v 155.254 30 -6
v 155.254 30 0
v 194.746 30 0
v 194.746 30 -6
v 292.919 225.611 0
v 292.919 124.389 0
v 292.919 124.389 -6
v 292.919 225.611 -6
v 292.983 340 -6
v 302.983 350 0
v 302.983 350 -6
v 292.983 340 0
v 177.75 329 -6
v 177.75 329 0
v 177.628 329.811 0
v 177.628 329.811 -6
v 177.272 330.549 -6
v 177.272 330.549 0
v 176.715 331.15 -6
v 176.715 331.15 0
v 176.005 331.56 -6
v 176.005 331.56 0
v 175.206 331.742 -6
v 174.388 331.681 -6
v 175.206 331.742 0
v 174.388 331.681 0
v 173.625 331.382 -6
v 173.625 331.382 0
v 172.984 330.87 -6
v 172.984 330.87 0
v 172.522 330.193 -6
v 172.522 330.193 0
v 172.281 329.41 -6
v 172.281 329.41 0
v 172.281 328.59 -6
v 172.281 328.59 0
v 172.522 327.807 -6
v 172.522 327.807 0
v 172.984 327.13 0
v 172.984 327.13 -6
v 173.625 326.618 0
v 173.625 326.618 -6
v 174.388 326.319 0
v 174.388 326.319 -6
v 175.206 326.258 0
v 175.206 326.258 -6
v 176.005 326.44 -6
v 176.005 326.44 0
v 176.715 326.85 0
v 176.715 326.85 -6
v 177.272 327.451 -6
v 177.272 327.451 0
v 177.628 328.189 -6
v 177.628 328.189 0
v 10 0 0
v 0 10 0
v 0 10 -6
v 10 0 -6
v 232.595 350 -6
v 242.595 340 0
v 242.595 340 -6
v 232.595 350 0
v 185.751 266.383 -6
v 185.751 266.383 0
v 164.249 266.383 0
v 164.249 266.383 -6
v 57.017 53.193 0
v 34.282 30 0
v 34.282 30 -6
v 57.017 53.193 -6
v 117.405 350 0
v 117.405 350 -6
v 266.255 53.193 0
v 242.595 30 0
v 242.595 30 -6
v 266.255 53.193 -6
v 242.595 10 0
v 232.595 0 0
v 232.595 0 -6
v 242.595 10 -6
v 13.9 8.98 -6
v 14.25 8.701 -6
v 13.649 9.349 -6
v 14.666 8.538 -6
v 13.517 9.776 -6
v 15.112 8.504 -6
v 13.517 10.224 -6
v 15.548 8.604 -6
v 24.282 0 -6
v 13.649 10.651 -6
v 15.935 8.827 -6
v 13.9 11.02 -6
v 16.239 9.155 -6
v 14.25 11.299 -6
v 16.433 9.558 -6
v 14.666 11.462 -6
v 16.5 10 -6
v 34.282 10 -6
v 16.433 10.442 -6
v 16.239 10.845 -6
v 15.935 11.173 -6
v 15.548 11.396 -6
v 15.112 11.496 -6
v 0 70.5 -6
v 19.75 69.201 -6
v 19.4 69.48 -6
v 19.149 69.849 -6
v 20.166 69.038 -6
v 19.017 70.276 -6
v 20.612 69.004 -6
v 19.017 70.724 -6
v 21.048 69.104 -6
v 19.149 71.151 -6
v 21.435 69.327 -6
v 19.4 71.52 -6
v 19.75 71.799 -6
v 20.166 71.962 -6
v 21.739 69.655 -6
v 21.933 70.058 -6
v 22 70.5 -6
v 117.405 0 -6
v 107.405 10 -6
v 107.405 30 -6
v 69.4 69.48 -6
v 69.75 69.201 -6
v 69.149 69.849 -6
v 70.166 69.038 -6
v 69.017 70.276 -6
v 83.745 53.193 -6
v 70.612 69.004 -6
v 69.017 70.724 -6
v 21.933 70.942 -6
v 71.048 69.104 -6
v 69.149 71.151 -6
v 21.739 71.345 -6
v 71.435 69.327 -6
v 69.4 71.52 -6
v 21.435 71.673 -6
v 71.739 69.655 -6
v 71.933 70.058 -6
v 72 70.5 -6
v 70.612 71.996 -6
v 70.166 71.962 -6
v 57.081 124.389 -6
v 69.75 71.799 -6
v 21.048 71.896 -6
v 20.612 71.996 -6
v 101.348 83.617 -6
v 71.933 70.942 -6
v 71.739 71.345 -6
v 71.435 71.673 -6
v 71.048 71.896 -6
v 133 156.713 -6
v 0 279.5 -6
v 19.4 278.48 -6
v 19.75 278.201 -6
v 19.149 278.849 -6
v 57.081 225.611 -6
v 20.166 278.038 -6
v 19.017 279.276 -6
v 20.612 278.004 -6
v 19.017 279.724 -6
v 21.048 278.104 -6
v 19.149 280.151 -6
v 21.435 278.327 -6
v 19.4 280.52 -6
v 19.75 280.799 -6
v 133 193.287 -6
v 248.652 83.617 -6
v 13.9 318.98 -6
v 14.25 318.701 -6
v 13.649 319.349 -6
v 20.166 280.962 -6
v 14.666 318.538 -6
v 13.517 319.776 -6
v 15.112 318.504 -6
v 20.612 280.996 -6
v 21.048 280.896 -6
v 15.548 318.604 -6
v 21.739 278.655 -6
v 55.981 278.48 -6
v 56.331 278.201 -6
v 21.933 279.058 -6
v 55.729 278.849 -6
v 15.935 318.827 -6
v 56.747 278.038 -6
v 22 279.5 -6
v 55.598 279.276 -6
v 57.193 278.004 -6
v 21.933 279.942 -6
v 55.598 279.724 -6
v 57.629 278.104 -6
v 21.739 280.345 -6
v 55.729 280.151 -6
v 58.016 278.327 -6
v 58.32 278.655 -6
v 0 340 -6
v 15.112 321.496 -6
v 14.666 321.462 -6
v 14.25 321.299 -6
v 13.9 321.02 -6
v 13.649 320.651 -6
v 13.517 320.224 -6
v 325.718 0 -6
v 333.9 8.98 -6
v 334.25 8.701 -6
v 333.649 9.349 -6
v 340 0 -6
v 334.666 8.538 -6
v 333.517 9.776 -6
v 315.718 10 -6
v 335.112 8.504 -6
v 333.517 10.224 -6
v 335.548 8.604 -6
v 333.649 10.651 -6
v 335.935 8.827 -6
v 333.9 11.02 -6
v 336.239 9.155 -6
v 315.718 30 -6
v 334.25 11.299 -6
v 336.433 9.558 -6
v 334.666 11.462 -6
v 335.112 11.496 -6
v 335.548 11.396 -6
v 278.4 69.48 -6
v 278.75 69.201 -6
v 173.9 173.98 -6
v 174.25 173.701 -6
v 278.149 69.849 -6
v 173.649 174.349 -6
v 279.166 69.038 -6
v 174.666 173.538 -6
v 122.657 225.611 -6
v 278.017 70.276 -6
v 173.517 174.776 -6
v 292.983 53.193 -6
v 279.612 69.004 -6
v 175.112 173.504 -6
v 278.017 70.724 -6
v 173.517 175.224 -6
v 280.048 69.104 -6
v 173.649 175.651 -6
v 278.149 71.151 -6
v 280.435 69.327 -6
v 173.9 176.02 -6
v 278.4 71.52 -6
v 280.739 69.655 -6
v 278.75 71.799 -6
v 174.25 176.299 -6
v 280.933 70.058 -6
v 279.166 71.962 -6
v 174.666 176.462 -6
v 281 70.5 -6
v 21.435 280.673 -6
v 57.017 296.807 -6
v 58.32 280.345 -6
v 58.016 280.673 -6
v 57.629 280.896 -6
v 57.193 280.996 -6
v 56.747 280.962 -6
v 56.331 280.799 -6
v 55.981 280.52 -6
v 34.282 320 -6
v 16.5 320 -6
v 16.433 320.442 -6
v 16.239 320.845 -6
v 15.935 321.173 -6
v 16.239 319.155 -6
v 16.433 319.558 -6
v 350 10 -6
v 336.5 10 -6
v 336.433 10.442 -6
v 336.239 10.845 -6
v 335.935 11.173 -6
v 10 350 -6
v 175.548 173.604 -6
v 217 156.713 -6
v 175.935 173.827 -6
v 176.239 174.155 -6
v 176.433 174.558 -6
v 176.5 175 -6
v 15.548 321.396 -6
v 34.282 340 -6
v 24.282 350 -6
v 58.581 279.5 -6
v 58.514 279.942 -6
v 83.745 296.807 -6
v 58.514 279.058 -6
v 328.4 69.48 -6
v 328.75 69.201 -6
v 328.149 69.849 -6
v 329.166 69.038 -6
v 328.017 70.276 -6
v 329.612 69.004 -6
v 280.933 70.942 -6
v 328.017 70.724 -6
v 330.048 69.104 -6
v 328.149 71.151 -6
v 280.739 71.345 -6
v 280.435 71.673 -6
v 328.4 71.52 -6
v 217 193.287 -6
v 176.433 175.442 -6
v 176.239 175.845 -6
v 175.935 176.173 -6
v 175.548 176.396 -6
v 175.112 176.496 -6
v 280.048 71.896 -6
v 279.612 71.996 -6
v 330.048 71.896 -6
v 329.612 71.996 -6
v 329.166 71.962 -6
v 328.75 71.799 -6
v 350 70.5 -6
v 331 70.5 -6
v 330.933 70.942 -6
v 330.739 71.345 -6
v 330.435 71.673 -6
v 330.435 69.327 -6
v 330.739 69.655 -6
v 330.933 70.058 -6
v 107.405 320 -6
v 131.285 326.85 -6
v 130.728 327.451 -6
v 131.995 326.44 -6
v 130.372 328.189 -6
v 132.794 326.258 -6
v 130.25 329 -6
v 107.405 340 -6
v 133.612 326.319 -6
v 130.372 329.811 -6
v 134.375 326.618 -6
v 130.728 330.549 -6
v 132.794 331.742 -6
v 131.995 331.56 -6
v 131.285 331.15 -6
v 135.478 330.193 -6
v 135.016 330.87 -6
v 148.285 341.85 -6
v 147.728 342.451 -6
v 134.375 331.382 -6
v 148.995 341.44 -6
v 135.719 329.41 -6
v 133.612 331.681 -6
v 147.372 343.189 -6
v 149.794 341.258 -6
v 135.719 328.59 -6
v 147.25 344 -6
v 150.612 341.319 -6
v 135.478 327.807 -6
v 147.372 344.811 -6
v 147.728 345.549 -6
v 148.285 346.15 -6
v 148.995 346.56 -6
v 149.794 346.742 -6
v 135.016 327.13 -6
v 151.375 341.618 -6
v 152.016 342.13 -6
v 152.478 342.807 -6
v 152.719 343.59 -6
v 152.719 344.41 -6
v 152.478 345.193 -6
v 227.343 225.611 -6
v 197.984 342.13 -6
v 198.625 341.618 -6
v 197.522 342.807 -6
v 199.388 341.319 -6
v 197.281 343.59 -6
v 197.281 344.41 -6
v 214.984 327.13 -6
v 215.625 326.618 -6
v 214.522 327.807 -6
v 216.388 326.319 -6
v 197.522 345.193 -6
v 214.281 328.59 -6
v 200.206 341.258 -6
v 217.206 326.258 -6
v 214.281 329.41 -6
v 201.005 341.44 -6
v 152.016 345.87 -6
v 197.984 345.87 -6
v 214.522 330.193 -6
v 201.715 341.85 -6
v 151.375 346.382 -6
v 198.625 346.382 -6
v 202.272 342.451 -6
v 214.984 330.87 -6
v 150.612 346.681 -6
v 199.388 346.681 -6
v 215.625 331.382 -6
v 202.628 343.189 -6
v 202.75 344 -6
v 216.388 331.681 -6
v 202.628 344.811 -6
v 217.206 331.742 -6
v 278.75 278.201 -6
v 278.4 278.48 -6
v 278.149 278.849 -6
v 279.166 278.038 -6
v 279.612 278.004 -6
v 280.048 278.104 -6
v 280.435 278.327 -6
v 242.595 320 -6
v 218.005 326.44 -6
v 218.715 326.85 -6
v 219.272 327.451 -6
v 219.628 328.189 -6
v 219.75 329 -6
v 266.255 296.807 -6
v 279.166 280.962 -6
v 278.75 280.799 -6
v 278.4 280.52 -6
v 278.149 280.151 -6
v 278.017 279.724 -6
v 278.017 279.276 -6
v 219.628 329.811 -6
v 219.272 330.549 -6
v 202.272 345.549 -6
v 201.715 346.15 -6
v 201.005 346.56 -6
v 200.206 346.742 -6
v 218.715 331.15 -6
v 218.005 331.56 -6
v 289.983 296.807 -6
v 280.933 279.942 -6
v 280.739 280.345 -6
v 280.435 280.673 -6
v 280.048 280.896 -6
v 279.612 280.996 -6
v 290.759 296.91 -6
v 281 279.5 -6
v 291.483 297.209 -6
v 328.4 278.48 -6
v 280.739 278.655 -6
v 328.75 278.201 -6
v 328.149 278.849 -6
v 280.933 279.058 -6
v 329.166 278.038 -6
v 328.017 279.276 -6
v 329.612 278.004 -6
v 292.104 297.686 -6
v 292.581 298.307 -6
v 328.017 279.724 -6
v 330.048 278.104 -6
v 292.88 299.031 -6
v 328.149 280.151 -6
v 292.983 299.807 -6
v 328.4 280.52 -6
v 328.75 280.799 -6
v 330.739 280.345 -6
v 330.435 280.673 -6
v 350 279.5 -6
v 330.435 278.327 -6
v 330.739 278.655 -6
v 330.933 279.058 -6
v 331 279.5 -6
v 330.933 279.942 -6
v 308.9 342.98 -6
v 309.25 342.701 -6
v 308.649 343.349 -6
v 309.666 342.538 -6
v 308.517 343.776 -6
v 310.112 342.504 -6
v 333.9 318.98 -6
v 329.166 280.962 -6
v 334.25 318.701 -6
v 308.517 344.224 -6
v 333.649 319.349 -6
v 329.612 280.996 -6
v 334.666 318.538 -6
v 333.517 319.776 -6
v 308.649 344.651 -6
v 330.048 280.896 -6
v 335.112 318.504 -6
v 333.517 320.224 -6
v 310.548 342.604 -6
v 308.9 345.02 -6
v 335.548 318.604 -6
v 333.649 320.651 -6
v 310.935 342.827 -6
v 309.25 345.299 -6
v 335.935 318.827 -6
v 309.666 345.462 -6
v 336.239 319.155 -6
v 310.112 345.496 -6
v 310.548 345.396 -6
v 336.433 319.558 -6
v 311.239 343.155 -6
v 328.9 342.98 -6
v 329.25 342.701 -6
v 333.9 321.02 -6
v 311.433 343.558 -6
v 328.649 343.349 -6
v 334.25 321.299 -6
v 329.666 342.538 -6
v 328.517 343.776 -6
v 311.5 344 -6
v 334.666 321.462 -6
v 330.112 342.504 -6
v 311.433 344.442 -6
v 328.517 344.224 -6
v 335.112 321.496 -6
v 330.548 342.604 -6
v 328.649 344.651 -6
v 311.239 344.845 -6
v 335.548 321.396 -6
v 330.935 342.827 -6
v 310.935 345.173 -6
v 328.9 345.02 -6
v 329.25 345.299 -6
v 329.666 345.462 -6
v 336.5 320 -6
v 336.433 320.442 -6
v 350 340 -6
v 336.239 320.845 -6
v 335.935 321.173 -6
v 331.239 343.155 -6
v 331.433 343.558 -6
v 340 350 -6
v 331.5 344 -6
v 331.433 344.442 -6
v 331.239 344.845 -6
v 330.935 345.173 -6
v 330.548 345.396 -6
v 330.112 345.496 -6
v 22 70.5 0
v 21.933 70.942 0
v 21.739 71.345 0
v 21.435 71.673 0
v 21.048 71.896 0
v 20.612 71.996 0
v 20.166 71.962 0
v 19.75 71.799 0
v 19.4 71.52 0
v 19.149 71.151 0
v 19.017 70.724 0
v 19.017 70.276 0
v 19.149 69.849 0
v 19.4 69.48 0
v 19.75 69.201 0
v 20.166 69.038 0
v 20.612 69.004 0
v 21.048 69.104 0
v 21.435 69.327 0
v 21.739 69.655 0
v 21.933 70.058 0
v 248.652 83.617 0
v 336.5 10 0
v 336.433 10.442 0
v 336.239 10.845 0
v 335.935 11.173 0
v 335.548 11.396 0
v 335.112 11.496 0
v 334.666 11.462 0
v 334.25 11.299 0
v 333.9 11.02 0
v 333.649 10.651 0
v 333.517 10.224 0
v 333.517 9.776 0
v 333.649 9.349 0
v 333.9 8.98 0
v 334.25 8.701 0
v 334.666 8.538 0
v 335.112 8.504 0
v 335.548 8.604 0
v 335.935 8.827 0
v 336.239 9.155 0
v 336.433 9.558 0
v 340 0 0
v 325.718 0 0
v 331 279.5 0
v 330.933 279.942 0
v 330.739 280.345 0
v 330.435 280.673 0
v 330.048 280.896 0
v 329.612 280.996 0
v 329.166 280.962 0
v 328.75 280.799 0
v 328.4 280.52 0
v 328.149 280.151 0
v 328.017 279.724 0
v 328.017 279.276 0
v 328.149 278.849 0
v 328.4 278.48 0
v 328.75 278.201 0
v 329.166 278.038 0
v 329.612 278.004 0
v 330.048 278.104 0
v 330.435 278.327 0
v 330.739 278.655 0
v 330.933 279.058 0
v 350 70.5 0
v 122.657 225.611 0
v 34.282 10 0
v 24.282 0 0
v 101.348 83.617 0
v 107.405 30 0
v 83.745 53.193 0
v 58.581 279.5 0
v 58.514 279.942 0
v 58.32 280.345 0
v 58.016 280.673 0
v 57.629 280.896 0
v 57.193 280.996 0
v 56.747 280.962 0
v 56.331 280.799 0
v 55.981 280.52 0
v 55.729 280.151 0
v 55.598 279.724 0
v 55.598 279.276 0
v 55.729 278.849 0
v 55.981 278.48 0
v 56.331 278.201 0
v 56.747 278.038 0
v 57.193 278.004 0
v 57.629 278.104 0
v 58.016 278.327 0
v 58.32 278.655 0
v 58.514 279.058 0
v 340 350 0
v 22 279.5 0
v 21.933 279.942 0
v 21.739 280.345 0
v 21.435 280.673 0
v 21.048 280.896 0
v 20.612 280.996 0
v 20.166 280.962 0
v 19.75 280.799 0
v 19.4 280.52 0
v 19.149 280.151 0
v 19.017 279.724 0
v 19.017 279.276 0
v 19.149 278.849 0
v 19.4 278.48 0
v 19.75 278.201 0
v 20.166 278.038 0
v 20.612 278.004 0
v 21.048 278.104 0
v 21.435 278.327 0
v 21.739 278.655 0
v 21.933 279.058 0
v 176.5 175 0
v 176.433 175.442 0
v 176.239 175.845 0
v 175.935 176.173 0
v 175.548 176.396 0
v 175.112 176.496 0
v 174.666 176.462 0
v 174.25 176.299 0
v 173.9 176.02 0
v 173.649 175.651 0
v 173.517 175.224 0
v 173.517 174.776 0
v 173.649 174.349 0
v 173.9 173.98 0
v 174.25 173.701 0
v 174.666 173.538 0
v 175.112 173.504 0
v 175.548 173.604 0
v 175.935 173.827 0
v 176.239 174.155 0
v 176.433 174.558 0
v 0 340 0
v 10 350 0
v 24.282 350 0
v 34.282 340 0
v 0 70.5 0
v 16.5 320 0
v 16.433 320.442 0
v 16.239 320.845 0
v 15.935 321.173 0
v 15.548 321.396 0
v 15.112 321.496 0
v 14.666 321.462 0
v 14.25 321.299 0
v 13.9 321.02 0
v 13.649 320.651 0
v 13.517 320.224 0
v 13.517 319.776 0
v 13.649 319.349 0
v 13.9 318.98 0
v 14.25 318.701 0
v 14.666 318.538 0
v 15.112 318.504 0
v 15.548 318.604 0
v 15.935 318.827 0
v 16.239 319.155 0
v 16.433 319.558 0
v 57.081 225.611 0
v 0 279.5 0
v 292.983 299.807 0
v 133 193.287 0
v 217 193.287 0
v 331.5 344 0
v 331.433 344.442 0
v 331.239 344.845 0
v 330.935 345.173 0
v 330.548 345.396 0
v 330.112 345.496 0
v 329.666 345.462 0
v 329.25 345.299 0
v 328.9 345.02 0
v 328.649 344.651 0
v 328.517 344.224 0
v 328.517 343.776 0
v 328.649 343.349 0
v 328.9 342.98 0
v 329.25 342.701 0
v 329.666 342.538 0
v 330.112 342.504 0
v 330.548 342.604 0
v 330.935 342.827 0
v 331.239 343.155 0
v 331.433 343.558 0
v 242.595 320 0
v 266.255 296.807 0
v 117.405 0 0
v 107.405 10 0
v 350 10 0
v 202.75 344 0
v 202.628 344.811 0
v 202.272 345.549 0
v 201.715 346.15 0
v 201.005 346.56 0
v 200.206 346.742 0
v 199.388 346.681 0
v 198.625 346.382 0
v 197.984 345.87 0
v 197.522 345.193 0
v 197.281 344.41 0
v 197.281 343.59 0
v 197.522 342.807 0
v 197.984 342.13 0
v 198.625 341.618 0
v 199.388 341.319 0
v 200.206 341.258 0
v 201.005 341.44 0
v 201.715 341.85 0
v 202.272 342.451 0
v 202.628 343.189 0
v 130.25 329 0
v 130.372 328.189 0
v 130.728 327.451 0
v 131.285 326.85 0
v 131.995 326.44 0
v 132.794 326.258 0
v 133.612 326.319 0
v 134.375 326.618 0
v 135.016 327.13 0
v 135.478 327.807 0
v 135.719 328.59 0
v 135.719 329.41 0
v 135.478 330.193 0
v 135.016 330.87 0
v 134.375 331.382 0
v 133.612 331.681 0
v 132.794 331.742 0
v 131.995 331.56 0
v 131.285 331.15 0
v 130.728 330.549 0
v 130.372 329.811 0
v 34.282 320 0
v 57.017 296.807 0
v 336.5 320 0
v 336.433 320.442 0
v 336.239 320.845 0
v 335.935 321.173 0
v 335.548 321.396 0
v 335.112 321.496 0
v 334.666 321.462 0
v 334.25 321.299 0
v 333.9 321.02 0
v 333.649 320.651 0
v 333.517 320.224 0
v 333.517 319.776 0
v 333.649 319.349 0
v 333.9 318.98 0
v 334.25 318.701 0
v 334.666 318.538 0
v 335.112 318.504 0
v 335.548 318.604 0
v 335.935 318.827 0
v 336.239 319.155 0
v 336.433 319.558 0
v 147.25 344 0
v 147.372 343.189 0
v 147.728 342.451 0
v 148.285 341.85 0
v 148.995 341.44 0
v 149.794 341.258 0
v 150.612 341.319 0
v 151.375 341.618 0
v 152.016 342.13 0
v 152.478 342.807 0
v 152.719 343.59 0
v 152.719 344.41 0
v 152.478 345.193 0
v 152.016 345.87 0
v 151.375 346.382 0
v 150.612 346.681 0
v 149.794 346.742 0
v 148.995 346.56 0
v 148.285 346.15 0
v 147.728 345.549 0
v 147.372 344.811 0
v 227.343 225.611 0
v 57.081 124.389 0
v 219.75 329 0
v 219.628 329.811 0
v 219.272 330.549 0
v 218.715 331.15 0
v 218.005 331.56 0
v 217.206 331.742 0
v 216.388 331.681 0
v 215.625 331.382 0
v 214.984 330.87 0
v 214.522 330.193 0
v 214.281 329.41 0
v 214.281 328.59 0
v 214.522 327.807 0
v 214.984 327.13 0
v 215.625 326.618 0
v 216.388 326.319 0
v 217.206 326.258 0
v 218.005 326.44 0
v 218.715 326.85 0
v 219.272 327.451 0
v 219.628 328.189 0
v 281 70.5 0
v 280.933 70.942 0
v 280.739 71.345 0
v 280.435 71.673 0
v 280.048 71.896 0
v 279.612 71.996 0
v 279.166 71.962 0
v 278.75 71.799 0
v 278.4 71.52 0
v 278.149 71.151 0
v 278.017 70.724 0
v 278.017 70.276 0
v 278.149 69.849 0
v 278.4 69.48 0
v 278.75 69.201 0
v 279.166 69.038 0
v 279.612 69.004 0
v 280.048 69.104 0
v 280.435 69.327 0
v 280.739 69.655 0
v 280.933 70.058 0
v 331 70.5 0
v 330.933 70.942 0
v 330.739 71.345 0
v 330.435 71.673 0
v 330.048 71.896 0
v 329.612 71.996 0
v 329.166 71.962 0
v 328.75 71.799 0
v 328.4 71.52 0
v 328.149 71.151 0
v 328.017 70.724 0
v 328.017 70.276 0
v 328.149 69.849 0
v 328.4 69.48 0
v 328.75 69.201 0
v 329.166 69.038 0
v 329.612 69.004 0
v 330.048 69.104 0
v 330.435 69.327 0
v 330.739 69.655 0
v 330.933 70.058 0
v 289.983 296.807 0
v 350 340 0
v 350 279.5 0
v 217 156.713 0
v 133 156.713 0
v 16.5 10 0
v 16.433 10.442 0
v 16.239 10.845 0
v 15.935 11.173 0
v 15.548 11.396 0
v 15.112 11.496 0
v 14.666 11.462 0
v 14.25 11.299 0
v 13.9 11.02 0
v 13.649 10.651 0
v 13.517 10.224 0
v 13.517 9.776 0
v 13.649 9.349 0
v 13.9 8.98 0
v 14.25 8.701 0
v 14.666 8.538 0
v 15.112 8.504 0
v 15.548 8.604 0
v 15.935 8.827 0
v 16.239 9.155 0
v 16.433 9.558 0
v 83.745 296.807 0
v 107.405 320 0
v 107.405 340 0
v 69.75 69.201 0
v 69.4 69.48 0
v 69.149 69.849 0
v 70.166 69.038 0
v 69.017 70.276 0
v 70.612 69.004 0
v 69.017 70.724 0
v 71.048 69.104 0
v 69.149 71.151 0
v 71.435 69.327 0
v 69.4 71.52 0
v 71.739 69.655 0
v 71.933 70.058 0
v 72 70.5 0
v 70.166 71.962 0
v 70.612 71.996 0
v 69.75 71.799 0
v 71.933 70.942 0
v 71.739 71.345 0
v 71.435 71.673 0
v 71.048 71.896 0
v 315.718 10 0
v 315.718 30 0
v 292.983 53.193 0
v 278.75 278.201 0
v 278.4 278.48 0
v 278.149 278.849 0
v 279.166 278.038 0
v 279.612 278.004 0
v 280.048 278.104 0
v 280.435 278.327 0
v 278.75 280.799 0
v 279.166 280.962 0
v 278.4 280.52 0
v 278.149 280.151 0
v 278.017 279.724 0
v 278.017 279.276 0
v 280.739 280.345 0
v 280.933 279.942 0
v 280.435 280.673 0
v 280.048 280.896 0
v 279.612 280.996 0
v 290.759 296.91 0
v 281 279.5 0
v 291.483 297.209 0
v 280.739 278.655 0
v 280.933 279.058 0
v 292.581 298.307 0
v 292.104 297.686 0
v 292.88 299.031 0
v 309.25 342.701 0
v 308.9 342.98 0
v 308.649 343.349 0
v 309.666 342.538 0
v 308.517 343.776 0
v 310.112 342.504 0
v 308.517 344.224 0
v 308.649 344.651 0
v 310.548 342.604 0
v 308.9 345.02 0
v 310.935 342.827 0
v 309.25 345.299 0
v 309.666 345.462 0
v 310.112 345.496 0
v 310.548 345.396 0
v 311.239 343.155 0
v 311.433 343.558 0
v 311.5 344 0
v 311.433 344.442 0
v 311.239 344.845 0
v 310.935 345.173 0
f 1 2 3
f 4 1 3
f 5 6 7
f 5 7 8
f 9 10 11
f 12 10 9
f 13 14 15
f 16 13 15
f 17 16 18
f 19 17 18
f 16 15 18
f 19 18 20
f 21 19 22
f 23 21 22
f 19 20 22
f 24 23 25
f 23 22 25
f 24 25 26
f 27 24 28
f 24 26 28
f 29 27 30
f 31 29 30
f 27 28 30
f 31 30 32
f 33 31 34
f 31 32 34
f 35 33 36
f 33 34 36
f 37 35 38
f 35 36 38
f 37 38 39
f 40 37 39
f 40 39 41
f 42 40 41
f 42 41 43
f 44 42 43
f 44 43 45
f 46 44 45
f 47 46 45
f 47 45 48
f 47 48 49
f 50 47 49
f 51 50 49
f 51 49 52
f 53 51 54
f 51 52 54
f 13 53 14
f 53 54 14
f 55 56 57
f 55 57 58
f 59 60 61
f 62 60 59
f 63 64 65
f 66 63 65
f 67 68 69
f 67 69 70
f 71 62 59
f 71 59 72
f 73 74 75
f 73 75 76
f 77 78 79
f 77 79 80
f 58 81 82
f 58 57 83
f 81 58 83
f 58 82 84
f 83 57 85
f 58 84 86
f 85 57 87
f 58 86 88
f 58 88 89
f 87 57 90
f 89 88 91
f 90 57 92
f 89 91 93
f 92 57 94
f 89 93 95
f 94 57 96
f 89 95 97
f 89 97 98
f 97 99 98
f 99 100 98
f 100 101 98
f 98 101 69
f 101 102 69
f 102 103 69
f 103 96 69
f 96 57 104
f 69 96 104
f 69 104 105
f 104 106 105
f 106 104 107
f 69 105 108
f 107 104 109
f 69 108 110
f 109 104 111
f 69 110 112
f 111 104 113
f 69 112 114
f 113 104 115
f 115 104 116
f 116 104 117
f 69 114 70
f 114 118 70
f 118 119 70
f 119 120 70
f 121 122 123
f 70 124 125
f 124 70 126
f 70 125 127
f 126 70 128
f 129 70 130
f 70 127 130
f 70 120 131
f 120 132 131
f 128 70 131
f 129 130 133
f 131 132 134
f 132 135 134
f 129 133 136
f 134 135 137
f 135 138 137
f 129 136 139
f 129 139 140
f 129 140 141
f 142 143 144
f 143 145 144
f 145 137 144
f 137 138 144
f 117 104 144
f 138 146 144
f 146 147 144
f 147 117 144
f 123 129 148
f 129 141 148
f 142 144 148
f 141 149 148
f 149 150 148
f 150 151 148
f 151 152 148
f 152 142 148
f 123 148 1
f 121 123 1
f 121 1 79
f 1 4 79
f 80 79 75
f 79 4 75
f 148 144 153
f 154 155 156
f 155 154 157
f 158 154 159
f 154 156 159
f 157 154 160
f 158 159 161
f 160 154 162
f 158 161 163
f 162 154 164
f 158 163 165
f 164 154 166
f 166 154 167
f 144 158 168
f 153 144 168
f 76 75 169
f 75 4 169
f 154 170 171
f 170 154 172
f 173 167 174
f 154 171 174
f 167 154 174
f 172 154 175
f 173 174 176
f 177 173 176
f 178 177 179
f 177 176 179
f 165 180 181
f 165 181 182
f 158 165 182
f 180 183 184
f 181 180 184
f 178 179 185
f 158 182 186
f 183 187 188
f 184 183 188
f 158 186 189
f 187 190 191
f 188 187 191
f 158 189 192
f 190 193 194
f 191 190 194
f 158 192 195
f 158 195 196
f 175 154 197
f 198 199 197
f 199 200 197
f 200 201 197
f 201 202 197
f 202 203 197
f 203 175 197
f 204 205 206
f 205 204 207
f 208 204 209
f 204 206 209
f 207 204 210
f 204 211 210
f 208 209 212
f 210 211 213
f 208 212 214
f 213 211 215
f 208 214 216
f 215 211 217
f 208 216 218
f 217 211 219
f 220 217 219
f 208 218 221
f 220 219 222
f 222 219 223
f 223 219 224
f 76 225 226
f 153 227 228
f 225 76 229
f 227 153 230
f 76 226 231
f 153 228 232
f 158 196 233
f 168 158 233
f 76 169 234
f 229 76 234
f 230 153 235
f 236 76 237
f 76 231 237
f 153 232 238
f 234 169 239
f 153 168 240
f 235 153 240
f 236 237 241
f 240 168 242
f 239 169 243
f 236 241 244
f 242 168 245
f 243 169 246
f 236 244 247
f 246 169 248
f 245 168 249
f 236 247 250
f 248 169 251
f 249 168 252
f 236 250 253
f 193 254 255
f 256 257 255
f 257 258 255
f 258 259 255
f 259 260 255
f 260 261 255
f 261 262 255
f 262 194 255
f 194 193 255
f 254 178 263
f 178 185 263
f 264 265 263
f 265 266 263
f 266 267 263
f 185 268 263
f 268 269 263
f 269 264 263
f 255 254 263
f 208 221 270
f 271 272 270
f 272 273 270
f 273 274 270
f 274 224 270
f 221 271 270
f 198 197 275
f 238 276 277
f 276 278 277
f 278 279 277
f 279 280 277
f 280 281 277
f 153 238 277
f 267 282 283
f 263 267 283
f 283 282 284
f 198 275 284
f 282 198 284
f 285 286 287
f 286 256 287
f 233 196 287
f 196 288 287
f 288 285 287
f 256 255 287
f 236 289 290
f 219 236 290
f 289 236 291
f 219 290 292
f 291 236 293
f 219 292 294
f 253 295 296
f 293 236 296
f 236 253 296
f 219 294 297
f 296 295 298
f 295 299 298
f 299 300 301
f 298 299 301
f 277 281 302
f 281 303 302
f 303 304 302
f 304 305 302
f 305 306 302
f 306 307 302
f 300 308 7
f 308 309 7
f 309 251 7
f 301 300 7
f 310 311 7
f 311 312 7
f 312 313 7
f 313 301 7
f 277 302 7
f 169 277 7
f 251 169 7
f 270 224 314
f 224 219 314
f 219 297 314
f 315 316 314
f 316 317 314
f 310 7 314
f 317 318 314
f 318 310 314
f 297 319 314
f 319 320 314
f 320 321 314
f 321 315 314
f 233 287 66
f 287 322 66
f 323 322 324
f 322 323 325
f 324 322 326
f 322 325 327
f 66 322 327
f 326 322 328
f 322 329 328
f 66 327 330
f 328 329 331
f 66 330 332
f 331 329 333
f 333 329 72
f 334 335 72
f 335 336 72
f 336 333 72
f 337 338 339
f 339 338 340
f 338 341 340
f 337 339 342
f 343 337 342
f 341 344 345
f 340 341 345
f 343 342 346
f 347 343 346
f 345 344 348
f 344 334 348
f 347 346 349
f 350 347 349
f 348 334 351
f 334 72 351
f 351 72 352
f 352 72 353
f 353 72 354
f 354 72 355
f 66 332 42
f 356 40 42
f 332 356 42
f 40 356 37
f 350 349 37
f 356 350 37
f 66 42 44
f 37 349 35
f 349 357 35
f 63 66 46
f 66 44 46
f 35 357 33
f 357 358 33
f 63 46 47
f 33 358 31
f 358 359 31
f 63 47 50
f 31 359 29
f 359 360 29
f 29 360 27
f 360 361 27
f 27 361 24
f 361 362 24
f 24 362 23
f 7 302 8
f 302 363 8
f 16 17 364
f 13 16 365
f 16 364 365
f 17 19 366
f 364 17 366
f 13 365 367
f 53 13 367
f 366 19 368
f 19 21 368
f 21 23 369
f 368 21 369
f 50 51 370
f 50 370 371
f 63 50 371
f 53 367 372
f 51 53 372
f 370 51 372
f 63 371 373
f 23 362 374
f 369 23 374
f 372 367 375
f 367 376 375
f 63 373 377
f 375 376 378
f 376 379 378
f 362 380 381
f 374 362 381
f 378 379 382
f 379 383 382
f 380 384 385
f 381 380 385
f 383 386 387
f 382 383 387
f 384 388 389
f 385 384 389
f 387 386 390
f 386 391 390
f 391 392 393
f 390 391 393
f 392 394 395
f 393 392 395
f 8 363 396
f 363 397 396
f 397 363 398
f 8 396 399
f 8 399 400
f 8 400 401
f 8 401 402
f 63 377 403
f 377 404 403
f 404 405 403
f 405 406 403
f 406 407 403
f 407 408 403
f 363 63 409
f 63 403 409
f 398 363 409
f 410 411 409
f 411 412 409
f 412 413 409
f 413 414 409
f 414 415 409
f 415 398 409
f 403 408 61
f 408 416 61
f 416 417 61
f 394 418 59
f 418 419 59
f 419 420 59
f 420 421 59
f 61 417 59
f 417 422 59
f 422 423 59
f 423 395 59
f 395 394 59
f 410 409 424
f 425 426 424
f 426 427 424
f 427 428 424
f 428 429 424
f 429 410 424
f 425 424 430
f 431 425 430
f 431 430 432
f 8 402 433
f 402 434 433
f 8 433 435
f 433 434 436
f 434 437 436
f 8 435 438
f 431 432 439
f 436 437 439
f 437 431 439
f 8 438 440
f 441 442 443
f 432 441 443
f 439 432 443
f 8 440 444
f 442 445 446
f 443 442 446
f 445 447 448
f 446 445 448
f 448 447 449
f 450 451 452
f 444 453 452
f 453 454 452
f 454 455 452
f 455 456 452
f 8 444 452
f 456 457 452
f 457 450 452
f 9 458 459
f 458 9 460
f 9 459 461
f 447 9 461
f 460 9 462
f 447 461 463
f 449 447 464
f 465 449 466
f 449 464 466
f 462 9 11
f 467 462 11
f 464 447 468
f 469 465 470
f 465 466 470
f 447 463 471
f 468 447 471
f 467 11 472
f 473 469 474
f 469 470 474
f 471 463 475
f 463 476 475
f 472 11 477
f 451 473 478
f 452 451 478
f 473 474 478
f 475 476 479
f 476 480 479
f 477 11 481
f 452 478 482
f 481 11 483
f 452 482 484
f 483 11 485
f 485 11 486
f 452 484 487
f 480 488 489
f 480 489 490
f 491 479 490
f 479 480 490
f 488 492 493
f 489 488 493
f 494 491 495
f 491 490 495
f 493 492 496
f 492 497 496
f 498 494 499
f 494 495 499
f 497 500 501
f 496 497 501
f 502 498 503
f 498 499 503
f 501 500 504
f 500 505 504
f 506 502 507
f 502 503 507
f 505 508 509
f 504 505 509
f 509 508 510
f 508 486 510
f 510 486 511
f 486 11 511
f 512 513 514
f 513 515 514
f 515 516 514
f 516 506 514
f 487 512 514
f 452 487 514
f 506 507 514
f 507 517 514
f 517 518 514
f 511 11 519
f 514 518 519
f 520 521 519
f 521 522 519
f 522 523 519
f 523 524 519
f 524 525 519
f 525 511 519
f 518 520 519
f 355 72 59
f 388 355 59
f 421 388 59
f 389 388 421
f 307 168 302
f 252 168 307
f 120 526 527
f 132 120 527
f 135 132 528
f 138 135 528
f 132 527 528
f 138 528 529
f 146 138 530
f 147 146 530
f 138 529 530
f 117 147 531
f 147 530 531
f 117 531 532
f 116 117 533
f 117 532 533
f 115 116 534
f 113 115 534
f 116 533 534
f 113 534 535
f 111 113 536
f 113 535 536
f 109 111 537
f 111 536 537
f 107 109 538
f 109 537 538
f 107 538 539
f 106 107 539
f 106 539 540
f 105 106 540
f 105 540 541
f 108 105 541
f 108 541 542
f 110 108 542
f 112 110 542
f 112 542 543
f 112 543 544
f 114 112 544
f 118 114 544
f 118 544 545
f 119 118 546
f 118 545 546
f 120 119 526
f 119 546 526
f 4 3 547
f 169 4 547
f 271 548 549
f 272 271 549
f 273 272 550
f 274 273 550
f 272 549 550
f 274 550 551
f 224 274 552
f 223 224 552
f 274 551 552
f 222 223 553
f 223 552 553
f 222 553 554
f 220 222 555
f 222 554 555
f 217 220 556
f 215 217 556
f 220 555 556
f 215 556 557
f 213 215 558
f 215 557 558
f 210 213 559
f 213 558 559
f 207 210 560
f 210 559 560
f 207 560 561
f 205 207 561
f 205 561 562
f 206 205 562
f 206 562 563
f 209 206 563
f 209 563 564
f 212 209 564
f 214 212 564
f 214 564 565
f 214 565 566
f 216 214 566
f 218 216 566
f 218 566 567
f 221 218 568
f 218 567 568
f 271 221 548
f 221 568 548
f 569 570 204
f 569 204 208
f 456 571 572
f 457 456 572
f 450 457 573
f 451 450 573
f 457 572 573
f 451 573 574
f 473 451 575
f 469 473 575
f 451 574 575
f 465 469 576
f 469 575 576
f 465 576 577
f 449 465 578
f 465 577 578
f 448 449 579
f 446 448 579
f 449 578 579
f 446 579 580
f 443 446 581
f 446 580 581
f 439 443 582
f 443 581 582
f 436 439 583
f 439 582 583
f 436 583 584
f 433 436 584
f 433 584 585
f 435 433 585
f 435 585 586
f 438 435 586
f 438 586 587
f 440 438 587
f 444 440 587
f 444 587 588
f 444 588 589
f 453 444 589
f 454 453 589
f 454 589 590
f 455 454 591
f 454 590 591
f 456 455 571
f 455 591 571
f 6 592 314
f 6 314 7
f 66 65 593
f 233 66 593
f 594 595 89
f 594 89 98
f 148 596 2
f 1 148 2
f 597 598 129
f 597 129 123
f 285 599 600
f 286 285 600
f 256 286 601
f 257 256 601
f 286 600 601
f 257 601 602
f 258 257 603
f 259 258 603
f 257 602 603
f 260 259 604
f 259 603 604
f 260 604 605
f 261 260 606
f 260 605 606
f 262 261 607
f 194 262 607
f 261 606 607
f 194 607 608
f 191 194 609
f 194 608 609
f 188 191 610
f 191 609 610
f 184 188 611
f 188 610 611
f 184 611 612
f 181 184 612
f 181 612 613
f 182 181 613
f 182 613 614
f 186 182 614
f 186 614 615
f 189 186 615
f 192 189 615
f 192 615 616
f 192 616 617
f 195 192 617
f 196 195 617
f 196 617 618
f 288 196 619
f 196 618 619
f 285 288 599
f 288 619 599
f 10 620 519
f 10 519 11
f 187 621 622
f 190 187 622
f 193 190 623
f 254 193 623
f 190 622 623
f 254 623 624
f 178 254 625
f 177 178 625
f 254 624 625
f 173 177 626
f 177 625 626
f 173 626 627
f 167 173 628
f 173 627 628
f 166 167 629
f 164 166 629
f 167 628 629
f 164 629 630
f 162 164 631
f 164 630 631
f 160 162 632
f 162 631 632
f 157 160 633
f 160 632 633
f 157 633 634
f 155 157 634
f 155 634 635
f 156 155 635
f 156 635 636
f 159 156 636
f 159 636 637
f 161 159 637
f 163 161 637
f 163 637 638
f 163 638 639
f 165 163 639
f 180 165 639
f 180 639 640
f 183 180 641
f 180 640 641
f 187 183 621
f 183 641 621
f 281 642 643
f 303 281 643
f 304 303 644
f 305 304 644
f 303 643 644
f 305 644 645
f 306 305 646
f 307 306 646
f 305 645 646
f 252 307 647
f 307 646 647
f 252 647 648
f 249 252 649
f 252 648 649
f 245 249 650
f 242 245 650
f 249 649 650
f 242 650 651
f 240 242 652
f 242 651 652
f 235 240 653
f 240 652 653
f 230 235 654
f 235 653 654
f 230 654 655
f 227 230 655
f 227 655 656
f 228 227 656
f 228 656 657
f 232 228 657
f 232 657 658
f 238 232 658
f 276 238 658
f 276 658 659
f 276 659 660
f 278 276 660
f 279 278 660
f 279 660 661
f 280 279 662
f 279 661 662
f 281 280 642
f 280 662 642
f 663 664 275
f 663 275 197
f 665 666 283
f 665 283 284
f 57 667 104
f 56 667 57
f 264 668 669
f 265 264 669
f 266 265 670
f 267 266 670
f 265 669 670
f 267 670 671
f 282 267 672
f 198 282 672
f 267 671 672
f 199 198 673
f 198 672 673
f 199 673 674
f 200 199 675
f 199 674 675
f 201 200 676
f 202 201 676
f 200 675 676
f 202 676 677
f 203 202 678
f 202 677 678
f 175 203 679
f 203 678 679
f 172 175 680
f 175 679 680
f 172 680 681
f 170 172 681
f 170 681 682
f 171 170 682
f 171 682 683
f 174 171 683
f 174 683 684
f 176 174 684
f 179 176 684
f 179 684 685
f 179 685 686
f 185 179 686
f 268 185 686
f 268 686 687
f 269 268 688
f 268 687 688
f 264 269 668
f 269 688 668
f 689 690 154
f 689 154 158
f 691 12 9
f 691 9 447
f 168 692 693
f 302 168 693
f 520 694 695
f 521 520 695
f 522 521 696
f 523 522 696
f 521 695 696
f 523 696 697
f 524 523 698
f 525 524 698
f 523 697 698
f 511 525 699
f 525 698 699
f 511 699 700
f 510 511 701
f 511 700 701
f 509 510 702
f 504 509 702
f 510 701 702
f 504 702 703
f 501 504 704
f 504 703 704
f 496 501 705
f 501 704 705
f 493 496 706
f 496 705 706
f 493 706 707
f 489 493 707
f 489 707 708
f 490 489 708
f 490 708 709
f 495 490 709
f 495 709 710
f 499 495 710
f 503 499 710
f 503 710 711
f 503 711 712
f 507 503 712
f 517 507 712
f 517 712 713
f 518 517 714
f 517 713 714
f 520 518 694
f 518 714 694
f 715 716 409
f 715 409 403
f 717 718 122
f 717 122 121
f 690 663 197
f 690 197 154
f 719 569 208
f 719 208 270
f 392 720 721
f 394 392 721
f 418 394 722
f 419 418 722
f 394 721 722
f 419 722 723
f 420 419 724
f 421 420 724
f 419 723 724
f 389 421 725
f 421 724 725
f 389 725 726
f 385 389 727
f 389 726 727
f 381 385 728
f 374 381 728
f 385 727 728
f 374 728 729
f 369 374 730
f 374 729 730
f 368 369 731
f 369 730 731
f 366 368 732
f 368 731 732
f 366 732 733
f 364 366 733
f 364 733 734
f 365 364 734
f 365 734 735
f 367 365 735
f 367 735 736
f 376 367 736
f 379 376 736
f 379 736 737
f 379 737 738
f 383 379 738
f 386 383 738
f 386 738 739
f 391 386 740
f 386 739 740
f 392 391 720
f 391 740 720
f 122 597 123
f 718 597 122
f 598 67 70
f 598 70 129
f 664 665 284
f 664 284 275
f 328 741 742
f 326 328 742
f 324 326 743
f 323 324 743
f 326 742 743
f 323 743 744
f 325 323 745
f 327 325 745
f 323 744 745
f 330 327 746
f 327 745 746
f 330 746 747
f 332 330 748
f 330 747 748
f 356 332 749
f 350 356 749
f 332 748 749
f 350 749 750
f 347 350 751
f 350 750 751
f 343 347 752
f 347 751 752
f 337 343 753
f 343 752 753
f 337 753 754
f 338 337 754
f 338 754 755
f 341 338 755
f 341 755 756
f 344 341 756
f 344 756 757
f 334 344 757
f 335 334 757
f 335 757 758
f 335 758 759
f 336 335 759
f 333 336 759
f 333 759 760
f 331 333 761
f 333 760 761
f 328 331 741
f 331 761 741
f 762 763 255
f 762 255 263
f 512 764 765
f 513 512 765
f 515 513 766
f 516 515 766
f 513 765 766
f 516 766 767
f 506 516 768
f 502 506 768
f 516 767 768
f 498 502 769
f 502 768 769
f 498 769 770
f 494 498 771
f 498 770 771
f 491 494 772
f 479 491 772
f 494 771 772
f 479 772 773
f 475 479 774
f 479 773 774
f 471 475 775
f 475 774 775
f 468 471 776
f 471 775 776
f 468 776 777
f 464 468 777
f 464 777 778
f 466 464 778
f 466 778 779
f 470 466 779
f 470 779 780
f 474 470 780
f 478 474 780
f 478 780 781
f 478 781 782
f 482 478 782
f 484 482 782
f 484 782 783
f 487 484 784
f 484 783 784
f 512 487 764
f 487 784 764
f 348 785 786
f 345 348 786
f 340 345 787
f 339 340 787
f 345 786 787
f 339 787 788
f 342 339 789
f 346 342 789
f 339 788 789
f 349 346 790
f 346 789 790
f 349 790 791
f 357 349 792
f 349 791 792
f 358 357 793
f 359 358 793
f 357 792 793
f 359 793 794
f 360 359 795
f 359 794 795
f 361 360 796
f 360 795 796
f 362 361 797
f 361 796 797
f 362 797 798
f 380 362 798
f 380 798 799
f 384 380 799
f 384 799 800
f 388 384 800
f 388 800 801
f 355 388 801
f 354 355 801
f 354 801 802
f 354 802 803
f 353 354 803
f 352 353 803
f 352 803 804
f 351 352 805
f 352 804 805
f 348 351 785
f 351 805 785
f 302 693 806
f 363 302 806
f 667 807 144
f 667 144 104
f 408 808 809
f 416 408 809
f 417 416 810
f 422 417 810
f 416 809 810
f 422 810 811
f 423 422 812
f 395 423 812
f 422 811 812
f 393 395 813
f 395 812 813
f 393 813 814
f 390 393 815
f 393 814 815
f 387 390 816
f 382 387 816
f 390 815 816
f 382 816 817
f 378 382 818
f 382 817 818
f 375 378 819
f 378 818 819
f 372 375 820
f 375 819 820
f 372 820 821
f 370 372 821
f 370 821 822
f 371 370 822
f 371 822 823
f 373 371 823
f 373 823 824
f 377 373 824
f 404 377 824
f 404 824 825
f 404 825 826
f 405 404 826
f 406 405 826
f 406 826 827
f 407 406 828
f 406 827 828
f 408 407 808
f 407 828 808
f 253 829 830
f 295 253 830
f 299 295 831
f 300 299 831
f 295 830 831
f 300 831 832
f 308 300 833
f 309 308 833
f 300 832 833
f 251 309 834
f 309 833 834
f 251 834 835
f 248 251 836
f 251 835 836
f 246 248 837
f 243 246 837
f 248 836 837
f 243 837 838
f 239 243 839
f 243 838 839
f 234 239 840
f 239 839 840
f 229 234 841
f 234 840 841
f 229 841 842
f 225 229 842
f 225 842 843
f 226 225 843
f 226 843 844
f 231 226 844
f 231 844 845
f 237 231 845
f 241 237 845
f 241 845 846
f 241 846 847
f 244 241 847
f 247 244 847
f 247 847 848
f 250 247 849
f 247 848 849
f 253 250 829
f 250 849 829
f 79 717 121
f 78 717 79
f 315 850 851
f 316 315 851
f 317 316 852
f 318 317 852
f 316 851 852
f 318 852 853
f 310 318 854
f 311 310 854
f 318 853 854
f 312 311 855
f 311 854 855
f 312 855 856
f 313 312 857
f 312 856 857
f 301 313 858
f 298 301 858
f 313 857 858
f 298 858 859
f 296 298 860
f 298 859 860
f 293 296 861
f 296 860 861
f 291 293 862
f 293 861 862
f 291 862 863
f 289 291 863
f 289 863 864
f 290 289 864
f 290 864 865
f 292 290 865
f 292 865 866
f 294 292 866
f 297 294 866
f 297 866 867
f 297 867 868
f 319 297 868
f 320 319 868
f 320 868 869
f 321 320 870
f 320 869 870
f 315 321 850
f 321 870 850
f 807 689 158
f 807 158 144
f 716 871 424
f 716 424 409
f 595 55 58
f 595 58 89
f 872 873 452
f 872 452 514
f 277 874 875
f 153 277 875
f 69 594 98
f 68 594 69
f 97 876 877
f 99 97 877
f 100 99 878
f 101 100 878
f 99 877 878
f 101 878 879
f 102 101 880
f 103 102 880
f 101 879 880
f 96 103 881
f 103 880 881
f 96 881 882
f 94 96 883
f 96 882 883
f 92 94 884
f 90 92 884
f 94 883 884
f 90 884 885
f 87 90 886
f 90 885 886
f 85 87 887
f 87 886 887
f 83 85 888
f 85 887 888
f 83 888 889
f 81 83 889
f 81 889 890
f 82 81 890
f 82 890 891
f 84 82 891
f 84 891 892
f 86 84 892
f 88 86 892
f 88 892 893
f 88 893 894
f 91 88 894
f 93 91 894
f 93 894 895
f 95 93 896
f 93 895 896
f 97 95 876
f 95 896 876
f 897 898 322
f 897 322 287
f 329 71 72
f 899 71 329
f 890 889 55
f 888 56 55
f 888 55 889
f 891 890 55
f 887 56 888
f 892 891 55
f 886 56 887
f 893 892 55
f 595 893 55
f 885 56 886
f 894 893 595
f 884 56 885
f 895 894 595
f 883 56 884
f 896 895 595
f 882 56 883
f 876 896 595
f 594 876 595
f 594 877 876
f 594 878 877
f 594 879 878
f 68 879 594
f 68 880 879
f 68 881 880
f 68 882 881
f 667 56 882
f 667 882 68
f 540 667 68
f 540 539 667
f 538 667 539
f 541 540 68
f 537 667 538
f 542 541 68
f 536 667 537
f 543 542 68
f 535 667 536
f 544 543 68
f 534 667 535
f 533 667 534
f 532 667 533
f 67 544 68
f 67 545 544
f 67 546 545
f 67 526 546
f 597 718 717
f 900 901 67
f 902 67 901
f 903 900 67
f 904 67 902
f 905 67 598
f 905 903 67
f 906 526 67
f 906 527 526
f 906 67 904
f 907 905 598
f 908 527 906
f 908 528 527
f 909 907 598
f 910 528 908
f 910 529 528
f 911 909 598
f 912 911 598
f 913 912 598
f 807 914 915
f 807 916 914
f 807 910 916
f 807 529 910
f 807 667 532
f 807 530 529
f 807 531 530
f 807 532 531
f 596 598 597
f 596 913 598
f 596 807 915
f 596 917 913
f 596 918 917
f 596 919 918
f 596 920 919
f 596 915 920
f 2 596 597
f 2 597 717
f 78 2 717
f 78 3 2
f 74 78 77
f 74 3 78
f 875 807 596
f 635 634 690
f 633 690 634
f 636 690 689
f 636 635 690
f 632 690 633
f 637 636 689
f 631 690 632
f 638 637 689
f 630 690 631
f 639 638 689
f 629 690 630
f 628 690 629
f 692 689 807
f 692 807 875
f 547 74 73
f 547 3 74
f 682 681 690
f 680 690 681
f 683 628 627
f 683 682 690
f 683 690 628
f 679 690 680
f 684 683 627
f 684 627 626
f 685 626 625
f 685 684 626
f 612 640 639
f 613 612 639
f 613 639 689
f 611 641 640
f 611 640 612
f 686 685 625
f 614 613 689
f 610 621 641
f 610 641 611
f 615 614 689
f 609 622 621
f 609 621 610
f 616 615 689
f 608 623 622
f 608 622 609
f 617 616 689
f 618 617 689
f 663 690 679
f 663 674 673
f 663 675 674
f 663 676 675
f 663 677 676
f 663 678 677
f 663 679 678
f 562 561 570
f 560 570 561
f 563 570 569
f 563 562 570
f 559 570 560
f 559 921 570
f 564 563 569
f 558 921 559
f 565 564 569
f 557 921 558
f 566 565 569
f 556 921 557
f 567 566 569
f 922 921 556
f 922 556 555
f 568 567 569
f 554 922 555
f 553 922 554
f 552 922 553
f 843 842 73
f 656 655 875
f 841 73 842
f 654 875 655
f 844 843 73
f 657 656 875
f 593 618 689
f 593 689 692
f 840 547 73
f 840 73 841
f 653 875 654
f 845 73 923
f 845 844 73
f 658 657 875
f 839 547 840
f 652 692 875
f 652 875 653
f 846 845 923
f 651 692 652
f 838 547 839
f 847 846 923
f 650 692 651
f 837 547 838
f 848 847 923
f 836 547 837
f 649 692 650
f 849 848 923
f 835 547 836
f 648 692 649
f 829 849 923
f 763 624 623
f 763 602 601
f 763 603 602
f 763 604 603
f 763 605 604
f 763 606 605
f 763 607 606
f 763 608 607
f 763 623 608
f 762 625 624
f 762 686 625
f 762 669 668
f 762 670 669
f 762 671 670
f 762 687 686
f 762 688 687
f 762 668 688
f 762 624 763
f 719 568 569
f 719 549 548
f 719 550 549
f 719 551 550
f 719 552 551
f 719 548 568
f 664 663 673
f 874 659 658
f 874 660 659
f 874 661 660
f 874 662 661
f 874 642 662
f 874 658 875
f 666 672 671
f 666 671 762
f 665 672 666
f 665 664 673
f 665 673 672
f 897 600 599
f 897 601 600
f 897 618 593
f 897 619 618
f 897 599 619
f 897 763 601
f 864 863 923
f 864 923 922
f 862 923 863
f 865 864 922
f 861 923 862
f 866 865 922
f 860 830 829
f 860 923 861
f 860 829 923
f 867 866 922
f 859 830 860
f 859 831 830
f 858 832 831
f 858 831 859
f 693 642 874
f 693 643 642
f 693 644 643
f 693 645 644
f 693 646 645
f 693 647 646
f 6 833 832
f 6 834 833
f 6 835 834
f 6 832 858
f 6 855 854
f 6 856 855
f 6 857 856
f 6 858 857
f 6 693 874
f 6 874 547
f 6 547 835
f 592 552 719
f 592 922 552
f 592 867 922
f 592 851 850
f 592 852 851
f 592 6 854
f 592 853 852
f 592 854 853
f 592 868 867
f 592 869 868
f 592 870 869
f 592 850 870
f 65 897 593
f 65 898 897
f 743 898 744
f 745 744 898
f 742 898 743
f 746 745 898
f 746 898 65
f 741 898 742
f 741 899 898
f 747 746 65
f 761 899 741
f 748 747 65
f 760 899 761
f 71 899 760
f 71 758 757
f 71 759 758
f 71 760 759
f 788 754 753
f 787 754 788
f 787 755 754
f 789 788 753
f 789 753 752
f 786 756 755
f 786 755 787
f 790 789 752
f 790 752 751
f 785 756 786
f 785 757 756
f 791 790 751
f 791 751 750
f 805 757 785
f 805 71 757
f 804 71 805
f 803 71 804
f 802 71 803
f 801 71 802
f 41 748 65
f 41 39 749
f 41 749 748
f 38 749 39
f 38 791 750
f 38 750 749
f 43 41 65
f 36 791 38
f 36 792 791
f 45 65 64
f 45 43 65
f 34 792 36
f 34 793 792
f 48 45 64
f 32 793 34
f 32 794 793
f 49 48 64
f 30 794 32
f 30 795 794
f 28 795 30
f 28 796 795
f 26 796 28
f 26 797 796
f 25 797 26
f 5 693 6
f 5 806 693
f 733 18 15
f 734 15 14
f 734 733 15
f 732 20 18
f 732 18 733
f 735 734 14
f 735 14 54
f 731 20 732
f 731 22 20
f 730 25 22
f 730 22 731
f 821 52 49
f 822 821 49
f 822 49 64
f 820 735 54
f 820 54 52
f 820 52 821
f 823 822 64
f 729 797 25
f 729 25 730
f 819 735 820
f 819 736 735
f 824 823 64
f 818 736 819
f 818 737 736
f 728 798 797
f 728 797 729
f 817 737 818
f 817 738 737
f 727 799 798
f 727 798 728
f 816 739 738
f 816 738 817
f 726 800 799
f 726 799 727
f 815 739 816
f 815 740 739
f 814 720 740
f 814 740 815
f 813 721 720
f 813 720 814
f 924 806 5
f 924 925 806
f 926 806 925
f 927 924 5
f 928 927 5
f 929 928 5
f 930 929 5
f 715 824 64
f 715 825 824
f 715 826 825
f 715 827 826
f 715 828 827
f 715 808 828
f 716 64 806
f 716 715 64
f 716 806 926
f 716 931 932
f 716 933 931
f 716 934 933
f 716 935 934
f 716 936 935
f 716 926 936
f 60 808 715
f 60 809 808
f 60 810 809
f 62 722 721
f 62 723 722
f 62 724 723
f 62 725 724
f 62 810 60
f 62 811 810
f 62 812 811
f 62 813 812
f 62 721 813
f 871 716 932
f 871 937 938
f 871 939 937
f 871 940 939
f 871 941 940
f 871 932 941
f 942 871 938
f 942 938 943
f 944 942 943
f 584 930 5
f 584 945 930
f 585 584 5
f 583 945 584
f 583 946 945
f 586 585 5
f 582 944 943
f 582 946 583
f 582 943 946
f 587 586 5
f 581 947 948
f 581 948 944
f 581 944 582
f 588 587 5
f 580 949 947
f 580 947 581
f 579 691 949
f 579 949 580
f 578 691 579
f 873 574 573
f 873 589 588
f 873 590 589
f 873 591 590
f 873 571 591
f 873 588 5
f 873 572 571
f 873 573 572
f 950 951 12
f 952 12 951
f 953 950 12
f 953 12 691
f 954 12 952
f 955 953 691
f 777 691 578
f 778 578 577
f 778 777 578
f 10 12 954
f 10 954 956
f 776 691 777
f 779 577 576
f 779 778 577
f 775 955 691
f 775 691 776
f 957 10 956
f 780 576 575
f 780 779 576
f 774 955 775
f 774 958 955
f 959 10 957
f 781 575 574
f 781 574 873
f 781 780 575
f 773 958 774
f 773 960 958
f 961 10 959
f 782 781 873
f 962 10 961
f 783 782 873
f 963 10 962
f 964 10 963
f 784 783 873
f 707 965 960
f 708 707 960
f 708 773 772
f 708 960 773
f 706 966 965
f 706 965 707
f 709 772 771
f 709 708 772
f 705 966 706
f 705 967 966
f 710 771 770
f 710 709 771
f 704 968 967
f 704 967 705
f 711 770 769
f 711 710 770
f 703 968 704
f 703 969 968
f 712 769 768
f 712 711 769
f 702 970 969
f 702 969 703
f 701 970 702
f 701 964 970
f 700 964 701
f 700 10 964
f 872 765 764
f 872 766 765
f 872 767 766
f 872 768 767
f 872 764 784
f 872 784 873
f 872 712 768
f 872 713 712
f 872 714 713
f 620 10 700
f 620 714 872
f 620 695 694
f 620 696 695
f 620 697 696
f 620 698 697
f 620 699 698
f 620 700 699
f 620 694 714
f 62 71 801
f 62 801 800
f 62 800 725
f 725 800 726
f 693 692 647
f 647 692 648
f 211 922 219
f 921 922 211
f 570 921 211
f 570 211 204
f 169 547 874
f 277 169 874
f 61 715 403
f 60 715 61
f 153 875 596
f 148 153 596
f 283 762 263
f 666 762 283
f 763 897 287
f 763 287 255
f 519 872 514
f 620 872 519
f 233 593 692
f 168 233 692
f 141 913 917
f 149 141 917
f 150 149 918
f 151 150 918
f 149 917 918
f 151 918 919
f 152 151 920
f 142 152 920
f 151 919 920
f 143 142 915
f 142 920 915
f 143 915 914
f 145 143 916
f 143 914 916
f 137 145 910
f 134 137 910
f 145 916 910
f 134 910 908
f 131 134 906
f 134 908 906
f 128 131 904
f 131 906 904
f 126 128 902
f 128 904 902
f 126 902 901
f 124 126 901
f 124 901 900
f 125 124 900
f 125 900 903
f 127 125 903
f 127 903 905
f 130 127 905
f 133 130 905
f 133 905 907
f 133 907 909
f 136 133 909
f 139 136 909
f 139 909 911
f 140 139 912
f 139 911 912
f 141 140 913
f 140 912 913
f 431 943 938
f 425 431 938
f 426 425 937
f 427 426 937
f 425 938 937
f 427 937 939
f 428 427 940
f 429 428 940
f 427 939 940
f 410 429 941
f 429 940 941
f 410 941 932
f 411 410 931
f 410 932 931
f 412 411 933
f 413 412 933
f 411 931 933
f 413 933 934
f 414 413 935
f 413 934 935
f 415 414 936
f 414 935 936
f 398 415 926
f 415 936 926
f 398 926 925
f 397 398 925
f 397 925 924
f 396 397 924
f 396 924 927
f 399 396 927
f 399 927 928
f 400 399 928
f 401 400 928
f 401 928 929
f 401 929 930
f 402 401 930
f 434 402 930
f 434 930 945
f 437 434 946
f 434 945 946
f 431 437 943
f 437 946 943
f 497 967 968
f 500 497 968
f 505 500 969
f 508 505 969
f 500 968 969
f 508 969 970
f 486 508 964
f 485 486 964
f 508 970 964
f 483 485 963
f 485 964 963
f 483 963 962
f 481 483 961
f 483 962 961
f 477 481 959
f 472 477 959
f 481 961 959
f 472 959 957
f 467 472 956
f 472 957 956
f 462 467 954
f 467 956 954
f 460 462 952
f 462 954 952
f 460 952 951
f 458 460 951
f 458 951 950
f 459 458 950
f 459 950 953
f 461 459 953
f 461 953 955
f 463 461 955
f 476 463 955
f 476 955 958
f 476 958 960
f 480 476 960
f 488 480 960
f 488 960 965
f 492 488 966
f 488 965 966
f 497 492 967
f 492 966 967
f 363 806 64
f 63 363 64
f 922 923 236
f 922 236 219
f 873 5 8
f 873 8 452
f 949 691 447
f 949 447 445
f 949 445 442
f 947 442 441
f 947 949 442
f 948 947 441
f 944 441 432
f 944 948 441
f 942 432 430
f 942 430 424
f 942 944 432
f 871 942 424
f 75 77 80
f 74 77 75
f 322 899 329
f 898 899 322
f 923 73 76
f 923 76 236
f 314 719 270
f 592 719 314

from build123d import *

# Parameters (mm, degrees)
SCHIZZO13_R                  = 1.5
SCHIZZO13_R_2                = 2.75
ESTRUSIONE_ESTRUSIONE2_DEPTH = 6


with BuildPart() as part:
    # Schizzo13 → Estrusione-Estrusione2 (new body)
    with BuildSketch(Plane.XY):
        with BuildLine():
            Line((10, 0), (24.28195797, 0))
            Line((24.28195797, 0), (34.28195797, 10))
            Line((34.28195797, 10), (34.28195797, 30))
            Line((34.28195797, 30), (57.017366293, 53.192694567))
            Line((57.017366293, 53.192694567), (83.745372993, 53.192694567))
            Line((83.745372993, 53.192694567), (107.404551383, 30))
            Line((107.404551383, 30), (107.404551383, 10))
            Line((107.404551383, 10), (117.404551383, 0))
            Line((117.404551383, 0), (232.595448617, 0))
            Line((232.595448617, 0), (242.595448617, 10))
            Line((242.595448617, 10), (242.595448617, 30))
            Line((242.595448617, 30), (266.254627007, 53.192694567))
            Line((266.254627007, 53.192694567), (292.982633707, 53.192694567))
            Line((292.982633707, 53.192694567), (315.71804203, 30))
            Line((315.71804203, 30), (315.71804203, 10))
            Line((315.71804203, 10), (325.71804203, 0))
            Line((325.71804203, 0), (340, 0))
            Line((340, 0), (350, 10))
            Line((350, 10), (350, 70.5))
            Line((350, 70.5), (292.919241786, 124.388863529))
            Line((292.919241786, 124.388863529), (292.919241786, 225.611136471))
            Line((292.919241786, 225.611136471), (350, 279.5))
            Line((350, 279.5), (350, 340))
            Line((350, 340), (340, 350))
            Line((340, 350), (302.982633707, 350))
            Line((302.982633707, 350), (292.982633707, 340))
            Line((292.982633707, 340), (292.982633707, 299.807305433))
            ThreePointArc((292.982633707, 299.807305433), (292.103954051, 297.685985089), (289.982633707, 296.807305433))
            Line((289.982633707, 296.807305433), (266.254627007, 296.807305433))
            Line((266.254627007, 296.807305433), (242.595448617, 320))
            Line((242.595448617, 320), (242.595448617, 340))
            Line((242.595448617, 340), (232.595448617, 350))
            Line((232.595448617, 350), (117.404551383, 350))
            Line((117.404551383, 350), (107.404551383, 340))
            Line((107.404551383, 340), (107.404551383, 320))
            Line((107.404551383, 320), (83.745372993, 296.807305433))
            Line((83.745372993, 296.807305433), (57.017366293, 296.807305433))
            Line((57.017366293, 296.807305433), (34.28195797, 320))
            Line((34.28195797, 320), (34.28195797, 340))
            Line((34.28195797, 340), (24.28195797, 350))
            Line((24.28195797, 350), (10, 350))
            Line((10, 350), (0, 340))
            Line((0, 340), (0, 279.5))
            Line((0, 279.5), (57.080758214, 225.611136471))
            Line((57.080758214, 225.611136471), (57.080758214, 175))
            Line((57.080758214, 175), (57.080758214, 124.388863529))
            Line((57.080758214, 124.388863529), (0, 70.5))
            Line((0, 70.5), (0, 10))
            Line((0, 10), (10, 0))
        make_face()
        with Locations((15, 320)):
            Circle(SCHIZZO13_R, mode=Mode.SUBTRACT)
        with Locations((20.5, 279.5)):
            Circle(SCHIZZO13_R, mode=Mode.SUBTRACT)
        with Locations((57.080758214, 279.5)):
            Circle(SCHIZZO13_R, mode=Mode.SUBTRACT)
        with Locations((175, 175)):
            Circle(SCHIZZO13_R, mode=Mode.SUBTRACT)
        with Locations((20.5, 70.5)):
            Circle(SCHIZZO13_R, mode=Mode.SUBTRACT)
        with Locations((200, 344)):
            Circle(SCHIZZO13_R_2, mode=Mode.SUBTRACT)
        with Locations(Location((150, 344, 0), (0, 0, 180))):
            Circle(SCHIZZO13_R_2, mode=Mode.SUBTRACT)
        with Locations((175, 329)):
            Circle(SCHIZZO13_R_2, mode=Mode.SUBTRACT)
        with Locations((217, 329)):
            Circle(SCHIZZO13_R_2, mode=Mode.SUBTRACT)
        with Locations(Location((133, 329, 0), (0, 0, 180))):
            Circle(SCHIZZO13_R_2, mode=Mode.SUBTRACT)
        with Locations((70.5, 70.5)):
            Circle(SCHIZZO13_R, mode=Mode.SUBTRACT)
        with Locations((279.5, 70.5)):
            Circle(SCHIZZO13_R, mode=Mode.SUBTRACT)
        with Locations((329.5, 70.5)):
            Circle(SCHIZZO13_R, mode=Mode.SUBTRACT)
        with Locations((335, 10)):
            Circle(SCHIZZO13_R, mode=Mode.SUBTRACT)
        with Locations((15, 10)):
            Circle(SCHIZZO13_R, mode=Mode.SUBTRACT)
        with Locations((279.5, 279.5)):
            Circle(SCHIZZO13_R, mode=Mode.SUBTRACT)
        with Locations((329.5, 279.5)):
            Circle(SCHIZZO13_R, mode=Mode.SUBTRACT)
        with Locations((335, 320)):
            Circle(SCHIZZO13_R, mode=Mode.SUBTRACT)
        with Locations((310, 344)):
            Circle(SCHIZZO13_R, mode=Mode.SUBTRACT)
        with Locations((330, 344)):
            Circle(SCHIZZO13_R, mode=Mode.SUBTRACT)
        Polygon((217, 193.286910978), (227.343033378, 225.611136471), (185.750894453, 266.383210572), (164.249105547, 266.383210572), (122.656966622, 225.611136471), (133, 193.286910978), align=None, mode=Mode.SUBTRACT)
        Polygon((133, 156.713089022), (101.348199345, 83.616789428), (155.254193112, 30), (194.745806888, 30), (248.651800655, 83.616789428), (217, 156.713089022), align=None, mode=Mode.SUBTRACT)
    extrude(amount=-ESTRUSIONE_ESTRUSIONE2_DEPTH)


solid = part.part
